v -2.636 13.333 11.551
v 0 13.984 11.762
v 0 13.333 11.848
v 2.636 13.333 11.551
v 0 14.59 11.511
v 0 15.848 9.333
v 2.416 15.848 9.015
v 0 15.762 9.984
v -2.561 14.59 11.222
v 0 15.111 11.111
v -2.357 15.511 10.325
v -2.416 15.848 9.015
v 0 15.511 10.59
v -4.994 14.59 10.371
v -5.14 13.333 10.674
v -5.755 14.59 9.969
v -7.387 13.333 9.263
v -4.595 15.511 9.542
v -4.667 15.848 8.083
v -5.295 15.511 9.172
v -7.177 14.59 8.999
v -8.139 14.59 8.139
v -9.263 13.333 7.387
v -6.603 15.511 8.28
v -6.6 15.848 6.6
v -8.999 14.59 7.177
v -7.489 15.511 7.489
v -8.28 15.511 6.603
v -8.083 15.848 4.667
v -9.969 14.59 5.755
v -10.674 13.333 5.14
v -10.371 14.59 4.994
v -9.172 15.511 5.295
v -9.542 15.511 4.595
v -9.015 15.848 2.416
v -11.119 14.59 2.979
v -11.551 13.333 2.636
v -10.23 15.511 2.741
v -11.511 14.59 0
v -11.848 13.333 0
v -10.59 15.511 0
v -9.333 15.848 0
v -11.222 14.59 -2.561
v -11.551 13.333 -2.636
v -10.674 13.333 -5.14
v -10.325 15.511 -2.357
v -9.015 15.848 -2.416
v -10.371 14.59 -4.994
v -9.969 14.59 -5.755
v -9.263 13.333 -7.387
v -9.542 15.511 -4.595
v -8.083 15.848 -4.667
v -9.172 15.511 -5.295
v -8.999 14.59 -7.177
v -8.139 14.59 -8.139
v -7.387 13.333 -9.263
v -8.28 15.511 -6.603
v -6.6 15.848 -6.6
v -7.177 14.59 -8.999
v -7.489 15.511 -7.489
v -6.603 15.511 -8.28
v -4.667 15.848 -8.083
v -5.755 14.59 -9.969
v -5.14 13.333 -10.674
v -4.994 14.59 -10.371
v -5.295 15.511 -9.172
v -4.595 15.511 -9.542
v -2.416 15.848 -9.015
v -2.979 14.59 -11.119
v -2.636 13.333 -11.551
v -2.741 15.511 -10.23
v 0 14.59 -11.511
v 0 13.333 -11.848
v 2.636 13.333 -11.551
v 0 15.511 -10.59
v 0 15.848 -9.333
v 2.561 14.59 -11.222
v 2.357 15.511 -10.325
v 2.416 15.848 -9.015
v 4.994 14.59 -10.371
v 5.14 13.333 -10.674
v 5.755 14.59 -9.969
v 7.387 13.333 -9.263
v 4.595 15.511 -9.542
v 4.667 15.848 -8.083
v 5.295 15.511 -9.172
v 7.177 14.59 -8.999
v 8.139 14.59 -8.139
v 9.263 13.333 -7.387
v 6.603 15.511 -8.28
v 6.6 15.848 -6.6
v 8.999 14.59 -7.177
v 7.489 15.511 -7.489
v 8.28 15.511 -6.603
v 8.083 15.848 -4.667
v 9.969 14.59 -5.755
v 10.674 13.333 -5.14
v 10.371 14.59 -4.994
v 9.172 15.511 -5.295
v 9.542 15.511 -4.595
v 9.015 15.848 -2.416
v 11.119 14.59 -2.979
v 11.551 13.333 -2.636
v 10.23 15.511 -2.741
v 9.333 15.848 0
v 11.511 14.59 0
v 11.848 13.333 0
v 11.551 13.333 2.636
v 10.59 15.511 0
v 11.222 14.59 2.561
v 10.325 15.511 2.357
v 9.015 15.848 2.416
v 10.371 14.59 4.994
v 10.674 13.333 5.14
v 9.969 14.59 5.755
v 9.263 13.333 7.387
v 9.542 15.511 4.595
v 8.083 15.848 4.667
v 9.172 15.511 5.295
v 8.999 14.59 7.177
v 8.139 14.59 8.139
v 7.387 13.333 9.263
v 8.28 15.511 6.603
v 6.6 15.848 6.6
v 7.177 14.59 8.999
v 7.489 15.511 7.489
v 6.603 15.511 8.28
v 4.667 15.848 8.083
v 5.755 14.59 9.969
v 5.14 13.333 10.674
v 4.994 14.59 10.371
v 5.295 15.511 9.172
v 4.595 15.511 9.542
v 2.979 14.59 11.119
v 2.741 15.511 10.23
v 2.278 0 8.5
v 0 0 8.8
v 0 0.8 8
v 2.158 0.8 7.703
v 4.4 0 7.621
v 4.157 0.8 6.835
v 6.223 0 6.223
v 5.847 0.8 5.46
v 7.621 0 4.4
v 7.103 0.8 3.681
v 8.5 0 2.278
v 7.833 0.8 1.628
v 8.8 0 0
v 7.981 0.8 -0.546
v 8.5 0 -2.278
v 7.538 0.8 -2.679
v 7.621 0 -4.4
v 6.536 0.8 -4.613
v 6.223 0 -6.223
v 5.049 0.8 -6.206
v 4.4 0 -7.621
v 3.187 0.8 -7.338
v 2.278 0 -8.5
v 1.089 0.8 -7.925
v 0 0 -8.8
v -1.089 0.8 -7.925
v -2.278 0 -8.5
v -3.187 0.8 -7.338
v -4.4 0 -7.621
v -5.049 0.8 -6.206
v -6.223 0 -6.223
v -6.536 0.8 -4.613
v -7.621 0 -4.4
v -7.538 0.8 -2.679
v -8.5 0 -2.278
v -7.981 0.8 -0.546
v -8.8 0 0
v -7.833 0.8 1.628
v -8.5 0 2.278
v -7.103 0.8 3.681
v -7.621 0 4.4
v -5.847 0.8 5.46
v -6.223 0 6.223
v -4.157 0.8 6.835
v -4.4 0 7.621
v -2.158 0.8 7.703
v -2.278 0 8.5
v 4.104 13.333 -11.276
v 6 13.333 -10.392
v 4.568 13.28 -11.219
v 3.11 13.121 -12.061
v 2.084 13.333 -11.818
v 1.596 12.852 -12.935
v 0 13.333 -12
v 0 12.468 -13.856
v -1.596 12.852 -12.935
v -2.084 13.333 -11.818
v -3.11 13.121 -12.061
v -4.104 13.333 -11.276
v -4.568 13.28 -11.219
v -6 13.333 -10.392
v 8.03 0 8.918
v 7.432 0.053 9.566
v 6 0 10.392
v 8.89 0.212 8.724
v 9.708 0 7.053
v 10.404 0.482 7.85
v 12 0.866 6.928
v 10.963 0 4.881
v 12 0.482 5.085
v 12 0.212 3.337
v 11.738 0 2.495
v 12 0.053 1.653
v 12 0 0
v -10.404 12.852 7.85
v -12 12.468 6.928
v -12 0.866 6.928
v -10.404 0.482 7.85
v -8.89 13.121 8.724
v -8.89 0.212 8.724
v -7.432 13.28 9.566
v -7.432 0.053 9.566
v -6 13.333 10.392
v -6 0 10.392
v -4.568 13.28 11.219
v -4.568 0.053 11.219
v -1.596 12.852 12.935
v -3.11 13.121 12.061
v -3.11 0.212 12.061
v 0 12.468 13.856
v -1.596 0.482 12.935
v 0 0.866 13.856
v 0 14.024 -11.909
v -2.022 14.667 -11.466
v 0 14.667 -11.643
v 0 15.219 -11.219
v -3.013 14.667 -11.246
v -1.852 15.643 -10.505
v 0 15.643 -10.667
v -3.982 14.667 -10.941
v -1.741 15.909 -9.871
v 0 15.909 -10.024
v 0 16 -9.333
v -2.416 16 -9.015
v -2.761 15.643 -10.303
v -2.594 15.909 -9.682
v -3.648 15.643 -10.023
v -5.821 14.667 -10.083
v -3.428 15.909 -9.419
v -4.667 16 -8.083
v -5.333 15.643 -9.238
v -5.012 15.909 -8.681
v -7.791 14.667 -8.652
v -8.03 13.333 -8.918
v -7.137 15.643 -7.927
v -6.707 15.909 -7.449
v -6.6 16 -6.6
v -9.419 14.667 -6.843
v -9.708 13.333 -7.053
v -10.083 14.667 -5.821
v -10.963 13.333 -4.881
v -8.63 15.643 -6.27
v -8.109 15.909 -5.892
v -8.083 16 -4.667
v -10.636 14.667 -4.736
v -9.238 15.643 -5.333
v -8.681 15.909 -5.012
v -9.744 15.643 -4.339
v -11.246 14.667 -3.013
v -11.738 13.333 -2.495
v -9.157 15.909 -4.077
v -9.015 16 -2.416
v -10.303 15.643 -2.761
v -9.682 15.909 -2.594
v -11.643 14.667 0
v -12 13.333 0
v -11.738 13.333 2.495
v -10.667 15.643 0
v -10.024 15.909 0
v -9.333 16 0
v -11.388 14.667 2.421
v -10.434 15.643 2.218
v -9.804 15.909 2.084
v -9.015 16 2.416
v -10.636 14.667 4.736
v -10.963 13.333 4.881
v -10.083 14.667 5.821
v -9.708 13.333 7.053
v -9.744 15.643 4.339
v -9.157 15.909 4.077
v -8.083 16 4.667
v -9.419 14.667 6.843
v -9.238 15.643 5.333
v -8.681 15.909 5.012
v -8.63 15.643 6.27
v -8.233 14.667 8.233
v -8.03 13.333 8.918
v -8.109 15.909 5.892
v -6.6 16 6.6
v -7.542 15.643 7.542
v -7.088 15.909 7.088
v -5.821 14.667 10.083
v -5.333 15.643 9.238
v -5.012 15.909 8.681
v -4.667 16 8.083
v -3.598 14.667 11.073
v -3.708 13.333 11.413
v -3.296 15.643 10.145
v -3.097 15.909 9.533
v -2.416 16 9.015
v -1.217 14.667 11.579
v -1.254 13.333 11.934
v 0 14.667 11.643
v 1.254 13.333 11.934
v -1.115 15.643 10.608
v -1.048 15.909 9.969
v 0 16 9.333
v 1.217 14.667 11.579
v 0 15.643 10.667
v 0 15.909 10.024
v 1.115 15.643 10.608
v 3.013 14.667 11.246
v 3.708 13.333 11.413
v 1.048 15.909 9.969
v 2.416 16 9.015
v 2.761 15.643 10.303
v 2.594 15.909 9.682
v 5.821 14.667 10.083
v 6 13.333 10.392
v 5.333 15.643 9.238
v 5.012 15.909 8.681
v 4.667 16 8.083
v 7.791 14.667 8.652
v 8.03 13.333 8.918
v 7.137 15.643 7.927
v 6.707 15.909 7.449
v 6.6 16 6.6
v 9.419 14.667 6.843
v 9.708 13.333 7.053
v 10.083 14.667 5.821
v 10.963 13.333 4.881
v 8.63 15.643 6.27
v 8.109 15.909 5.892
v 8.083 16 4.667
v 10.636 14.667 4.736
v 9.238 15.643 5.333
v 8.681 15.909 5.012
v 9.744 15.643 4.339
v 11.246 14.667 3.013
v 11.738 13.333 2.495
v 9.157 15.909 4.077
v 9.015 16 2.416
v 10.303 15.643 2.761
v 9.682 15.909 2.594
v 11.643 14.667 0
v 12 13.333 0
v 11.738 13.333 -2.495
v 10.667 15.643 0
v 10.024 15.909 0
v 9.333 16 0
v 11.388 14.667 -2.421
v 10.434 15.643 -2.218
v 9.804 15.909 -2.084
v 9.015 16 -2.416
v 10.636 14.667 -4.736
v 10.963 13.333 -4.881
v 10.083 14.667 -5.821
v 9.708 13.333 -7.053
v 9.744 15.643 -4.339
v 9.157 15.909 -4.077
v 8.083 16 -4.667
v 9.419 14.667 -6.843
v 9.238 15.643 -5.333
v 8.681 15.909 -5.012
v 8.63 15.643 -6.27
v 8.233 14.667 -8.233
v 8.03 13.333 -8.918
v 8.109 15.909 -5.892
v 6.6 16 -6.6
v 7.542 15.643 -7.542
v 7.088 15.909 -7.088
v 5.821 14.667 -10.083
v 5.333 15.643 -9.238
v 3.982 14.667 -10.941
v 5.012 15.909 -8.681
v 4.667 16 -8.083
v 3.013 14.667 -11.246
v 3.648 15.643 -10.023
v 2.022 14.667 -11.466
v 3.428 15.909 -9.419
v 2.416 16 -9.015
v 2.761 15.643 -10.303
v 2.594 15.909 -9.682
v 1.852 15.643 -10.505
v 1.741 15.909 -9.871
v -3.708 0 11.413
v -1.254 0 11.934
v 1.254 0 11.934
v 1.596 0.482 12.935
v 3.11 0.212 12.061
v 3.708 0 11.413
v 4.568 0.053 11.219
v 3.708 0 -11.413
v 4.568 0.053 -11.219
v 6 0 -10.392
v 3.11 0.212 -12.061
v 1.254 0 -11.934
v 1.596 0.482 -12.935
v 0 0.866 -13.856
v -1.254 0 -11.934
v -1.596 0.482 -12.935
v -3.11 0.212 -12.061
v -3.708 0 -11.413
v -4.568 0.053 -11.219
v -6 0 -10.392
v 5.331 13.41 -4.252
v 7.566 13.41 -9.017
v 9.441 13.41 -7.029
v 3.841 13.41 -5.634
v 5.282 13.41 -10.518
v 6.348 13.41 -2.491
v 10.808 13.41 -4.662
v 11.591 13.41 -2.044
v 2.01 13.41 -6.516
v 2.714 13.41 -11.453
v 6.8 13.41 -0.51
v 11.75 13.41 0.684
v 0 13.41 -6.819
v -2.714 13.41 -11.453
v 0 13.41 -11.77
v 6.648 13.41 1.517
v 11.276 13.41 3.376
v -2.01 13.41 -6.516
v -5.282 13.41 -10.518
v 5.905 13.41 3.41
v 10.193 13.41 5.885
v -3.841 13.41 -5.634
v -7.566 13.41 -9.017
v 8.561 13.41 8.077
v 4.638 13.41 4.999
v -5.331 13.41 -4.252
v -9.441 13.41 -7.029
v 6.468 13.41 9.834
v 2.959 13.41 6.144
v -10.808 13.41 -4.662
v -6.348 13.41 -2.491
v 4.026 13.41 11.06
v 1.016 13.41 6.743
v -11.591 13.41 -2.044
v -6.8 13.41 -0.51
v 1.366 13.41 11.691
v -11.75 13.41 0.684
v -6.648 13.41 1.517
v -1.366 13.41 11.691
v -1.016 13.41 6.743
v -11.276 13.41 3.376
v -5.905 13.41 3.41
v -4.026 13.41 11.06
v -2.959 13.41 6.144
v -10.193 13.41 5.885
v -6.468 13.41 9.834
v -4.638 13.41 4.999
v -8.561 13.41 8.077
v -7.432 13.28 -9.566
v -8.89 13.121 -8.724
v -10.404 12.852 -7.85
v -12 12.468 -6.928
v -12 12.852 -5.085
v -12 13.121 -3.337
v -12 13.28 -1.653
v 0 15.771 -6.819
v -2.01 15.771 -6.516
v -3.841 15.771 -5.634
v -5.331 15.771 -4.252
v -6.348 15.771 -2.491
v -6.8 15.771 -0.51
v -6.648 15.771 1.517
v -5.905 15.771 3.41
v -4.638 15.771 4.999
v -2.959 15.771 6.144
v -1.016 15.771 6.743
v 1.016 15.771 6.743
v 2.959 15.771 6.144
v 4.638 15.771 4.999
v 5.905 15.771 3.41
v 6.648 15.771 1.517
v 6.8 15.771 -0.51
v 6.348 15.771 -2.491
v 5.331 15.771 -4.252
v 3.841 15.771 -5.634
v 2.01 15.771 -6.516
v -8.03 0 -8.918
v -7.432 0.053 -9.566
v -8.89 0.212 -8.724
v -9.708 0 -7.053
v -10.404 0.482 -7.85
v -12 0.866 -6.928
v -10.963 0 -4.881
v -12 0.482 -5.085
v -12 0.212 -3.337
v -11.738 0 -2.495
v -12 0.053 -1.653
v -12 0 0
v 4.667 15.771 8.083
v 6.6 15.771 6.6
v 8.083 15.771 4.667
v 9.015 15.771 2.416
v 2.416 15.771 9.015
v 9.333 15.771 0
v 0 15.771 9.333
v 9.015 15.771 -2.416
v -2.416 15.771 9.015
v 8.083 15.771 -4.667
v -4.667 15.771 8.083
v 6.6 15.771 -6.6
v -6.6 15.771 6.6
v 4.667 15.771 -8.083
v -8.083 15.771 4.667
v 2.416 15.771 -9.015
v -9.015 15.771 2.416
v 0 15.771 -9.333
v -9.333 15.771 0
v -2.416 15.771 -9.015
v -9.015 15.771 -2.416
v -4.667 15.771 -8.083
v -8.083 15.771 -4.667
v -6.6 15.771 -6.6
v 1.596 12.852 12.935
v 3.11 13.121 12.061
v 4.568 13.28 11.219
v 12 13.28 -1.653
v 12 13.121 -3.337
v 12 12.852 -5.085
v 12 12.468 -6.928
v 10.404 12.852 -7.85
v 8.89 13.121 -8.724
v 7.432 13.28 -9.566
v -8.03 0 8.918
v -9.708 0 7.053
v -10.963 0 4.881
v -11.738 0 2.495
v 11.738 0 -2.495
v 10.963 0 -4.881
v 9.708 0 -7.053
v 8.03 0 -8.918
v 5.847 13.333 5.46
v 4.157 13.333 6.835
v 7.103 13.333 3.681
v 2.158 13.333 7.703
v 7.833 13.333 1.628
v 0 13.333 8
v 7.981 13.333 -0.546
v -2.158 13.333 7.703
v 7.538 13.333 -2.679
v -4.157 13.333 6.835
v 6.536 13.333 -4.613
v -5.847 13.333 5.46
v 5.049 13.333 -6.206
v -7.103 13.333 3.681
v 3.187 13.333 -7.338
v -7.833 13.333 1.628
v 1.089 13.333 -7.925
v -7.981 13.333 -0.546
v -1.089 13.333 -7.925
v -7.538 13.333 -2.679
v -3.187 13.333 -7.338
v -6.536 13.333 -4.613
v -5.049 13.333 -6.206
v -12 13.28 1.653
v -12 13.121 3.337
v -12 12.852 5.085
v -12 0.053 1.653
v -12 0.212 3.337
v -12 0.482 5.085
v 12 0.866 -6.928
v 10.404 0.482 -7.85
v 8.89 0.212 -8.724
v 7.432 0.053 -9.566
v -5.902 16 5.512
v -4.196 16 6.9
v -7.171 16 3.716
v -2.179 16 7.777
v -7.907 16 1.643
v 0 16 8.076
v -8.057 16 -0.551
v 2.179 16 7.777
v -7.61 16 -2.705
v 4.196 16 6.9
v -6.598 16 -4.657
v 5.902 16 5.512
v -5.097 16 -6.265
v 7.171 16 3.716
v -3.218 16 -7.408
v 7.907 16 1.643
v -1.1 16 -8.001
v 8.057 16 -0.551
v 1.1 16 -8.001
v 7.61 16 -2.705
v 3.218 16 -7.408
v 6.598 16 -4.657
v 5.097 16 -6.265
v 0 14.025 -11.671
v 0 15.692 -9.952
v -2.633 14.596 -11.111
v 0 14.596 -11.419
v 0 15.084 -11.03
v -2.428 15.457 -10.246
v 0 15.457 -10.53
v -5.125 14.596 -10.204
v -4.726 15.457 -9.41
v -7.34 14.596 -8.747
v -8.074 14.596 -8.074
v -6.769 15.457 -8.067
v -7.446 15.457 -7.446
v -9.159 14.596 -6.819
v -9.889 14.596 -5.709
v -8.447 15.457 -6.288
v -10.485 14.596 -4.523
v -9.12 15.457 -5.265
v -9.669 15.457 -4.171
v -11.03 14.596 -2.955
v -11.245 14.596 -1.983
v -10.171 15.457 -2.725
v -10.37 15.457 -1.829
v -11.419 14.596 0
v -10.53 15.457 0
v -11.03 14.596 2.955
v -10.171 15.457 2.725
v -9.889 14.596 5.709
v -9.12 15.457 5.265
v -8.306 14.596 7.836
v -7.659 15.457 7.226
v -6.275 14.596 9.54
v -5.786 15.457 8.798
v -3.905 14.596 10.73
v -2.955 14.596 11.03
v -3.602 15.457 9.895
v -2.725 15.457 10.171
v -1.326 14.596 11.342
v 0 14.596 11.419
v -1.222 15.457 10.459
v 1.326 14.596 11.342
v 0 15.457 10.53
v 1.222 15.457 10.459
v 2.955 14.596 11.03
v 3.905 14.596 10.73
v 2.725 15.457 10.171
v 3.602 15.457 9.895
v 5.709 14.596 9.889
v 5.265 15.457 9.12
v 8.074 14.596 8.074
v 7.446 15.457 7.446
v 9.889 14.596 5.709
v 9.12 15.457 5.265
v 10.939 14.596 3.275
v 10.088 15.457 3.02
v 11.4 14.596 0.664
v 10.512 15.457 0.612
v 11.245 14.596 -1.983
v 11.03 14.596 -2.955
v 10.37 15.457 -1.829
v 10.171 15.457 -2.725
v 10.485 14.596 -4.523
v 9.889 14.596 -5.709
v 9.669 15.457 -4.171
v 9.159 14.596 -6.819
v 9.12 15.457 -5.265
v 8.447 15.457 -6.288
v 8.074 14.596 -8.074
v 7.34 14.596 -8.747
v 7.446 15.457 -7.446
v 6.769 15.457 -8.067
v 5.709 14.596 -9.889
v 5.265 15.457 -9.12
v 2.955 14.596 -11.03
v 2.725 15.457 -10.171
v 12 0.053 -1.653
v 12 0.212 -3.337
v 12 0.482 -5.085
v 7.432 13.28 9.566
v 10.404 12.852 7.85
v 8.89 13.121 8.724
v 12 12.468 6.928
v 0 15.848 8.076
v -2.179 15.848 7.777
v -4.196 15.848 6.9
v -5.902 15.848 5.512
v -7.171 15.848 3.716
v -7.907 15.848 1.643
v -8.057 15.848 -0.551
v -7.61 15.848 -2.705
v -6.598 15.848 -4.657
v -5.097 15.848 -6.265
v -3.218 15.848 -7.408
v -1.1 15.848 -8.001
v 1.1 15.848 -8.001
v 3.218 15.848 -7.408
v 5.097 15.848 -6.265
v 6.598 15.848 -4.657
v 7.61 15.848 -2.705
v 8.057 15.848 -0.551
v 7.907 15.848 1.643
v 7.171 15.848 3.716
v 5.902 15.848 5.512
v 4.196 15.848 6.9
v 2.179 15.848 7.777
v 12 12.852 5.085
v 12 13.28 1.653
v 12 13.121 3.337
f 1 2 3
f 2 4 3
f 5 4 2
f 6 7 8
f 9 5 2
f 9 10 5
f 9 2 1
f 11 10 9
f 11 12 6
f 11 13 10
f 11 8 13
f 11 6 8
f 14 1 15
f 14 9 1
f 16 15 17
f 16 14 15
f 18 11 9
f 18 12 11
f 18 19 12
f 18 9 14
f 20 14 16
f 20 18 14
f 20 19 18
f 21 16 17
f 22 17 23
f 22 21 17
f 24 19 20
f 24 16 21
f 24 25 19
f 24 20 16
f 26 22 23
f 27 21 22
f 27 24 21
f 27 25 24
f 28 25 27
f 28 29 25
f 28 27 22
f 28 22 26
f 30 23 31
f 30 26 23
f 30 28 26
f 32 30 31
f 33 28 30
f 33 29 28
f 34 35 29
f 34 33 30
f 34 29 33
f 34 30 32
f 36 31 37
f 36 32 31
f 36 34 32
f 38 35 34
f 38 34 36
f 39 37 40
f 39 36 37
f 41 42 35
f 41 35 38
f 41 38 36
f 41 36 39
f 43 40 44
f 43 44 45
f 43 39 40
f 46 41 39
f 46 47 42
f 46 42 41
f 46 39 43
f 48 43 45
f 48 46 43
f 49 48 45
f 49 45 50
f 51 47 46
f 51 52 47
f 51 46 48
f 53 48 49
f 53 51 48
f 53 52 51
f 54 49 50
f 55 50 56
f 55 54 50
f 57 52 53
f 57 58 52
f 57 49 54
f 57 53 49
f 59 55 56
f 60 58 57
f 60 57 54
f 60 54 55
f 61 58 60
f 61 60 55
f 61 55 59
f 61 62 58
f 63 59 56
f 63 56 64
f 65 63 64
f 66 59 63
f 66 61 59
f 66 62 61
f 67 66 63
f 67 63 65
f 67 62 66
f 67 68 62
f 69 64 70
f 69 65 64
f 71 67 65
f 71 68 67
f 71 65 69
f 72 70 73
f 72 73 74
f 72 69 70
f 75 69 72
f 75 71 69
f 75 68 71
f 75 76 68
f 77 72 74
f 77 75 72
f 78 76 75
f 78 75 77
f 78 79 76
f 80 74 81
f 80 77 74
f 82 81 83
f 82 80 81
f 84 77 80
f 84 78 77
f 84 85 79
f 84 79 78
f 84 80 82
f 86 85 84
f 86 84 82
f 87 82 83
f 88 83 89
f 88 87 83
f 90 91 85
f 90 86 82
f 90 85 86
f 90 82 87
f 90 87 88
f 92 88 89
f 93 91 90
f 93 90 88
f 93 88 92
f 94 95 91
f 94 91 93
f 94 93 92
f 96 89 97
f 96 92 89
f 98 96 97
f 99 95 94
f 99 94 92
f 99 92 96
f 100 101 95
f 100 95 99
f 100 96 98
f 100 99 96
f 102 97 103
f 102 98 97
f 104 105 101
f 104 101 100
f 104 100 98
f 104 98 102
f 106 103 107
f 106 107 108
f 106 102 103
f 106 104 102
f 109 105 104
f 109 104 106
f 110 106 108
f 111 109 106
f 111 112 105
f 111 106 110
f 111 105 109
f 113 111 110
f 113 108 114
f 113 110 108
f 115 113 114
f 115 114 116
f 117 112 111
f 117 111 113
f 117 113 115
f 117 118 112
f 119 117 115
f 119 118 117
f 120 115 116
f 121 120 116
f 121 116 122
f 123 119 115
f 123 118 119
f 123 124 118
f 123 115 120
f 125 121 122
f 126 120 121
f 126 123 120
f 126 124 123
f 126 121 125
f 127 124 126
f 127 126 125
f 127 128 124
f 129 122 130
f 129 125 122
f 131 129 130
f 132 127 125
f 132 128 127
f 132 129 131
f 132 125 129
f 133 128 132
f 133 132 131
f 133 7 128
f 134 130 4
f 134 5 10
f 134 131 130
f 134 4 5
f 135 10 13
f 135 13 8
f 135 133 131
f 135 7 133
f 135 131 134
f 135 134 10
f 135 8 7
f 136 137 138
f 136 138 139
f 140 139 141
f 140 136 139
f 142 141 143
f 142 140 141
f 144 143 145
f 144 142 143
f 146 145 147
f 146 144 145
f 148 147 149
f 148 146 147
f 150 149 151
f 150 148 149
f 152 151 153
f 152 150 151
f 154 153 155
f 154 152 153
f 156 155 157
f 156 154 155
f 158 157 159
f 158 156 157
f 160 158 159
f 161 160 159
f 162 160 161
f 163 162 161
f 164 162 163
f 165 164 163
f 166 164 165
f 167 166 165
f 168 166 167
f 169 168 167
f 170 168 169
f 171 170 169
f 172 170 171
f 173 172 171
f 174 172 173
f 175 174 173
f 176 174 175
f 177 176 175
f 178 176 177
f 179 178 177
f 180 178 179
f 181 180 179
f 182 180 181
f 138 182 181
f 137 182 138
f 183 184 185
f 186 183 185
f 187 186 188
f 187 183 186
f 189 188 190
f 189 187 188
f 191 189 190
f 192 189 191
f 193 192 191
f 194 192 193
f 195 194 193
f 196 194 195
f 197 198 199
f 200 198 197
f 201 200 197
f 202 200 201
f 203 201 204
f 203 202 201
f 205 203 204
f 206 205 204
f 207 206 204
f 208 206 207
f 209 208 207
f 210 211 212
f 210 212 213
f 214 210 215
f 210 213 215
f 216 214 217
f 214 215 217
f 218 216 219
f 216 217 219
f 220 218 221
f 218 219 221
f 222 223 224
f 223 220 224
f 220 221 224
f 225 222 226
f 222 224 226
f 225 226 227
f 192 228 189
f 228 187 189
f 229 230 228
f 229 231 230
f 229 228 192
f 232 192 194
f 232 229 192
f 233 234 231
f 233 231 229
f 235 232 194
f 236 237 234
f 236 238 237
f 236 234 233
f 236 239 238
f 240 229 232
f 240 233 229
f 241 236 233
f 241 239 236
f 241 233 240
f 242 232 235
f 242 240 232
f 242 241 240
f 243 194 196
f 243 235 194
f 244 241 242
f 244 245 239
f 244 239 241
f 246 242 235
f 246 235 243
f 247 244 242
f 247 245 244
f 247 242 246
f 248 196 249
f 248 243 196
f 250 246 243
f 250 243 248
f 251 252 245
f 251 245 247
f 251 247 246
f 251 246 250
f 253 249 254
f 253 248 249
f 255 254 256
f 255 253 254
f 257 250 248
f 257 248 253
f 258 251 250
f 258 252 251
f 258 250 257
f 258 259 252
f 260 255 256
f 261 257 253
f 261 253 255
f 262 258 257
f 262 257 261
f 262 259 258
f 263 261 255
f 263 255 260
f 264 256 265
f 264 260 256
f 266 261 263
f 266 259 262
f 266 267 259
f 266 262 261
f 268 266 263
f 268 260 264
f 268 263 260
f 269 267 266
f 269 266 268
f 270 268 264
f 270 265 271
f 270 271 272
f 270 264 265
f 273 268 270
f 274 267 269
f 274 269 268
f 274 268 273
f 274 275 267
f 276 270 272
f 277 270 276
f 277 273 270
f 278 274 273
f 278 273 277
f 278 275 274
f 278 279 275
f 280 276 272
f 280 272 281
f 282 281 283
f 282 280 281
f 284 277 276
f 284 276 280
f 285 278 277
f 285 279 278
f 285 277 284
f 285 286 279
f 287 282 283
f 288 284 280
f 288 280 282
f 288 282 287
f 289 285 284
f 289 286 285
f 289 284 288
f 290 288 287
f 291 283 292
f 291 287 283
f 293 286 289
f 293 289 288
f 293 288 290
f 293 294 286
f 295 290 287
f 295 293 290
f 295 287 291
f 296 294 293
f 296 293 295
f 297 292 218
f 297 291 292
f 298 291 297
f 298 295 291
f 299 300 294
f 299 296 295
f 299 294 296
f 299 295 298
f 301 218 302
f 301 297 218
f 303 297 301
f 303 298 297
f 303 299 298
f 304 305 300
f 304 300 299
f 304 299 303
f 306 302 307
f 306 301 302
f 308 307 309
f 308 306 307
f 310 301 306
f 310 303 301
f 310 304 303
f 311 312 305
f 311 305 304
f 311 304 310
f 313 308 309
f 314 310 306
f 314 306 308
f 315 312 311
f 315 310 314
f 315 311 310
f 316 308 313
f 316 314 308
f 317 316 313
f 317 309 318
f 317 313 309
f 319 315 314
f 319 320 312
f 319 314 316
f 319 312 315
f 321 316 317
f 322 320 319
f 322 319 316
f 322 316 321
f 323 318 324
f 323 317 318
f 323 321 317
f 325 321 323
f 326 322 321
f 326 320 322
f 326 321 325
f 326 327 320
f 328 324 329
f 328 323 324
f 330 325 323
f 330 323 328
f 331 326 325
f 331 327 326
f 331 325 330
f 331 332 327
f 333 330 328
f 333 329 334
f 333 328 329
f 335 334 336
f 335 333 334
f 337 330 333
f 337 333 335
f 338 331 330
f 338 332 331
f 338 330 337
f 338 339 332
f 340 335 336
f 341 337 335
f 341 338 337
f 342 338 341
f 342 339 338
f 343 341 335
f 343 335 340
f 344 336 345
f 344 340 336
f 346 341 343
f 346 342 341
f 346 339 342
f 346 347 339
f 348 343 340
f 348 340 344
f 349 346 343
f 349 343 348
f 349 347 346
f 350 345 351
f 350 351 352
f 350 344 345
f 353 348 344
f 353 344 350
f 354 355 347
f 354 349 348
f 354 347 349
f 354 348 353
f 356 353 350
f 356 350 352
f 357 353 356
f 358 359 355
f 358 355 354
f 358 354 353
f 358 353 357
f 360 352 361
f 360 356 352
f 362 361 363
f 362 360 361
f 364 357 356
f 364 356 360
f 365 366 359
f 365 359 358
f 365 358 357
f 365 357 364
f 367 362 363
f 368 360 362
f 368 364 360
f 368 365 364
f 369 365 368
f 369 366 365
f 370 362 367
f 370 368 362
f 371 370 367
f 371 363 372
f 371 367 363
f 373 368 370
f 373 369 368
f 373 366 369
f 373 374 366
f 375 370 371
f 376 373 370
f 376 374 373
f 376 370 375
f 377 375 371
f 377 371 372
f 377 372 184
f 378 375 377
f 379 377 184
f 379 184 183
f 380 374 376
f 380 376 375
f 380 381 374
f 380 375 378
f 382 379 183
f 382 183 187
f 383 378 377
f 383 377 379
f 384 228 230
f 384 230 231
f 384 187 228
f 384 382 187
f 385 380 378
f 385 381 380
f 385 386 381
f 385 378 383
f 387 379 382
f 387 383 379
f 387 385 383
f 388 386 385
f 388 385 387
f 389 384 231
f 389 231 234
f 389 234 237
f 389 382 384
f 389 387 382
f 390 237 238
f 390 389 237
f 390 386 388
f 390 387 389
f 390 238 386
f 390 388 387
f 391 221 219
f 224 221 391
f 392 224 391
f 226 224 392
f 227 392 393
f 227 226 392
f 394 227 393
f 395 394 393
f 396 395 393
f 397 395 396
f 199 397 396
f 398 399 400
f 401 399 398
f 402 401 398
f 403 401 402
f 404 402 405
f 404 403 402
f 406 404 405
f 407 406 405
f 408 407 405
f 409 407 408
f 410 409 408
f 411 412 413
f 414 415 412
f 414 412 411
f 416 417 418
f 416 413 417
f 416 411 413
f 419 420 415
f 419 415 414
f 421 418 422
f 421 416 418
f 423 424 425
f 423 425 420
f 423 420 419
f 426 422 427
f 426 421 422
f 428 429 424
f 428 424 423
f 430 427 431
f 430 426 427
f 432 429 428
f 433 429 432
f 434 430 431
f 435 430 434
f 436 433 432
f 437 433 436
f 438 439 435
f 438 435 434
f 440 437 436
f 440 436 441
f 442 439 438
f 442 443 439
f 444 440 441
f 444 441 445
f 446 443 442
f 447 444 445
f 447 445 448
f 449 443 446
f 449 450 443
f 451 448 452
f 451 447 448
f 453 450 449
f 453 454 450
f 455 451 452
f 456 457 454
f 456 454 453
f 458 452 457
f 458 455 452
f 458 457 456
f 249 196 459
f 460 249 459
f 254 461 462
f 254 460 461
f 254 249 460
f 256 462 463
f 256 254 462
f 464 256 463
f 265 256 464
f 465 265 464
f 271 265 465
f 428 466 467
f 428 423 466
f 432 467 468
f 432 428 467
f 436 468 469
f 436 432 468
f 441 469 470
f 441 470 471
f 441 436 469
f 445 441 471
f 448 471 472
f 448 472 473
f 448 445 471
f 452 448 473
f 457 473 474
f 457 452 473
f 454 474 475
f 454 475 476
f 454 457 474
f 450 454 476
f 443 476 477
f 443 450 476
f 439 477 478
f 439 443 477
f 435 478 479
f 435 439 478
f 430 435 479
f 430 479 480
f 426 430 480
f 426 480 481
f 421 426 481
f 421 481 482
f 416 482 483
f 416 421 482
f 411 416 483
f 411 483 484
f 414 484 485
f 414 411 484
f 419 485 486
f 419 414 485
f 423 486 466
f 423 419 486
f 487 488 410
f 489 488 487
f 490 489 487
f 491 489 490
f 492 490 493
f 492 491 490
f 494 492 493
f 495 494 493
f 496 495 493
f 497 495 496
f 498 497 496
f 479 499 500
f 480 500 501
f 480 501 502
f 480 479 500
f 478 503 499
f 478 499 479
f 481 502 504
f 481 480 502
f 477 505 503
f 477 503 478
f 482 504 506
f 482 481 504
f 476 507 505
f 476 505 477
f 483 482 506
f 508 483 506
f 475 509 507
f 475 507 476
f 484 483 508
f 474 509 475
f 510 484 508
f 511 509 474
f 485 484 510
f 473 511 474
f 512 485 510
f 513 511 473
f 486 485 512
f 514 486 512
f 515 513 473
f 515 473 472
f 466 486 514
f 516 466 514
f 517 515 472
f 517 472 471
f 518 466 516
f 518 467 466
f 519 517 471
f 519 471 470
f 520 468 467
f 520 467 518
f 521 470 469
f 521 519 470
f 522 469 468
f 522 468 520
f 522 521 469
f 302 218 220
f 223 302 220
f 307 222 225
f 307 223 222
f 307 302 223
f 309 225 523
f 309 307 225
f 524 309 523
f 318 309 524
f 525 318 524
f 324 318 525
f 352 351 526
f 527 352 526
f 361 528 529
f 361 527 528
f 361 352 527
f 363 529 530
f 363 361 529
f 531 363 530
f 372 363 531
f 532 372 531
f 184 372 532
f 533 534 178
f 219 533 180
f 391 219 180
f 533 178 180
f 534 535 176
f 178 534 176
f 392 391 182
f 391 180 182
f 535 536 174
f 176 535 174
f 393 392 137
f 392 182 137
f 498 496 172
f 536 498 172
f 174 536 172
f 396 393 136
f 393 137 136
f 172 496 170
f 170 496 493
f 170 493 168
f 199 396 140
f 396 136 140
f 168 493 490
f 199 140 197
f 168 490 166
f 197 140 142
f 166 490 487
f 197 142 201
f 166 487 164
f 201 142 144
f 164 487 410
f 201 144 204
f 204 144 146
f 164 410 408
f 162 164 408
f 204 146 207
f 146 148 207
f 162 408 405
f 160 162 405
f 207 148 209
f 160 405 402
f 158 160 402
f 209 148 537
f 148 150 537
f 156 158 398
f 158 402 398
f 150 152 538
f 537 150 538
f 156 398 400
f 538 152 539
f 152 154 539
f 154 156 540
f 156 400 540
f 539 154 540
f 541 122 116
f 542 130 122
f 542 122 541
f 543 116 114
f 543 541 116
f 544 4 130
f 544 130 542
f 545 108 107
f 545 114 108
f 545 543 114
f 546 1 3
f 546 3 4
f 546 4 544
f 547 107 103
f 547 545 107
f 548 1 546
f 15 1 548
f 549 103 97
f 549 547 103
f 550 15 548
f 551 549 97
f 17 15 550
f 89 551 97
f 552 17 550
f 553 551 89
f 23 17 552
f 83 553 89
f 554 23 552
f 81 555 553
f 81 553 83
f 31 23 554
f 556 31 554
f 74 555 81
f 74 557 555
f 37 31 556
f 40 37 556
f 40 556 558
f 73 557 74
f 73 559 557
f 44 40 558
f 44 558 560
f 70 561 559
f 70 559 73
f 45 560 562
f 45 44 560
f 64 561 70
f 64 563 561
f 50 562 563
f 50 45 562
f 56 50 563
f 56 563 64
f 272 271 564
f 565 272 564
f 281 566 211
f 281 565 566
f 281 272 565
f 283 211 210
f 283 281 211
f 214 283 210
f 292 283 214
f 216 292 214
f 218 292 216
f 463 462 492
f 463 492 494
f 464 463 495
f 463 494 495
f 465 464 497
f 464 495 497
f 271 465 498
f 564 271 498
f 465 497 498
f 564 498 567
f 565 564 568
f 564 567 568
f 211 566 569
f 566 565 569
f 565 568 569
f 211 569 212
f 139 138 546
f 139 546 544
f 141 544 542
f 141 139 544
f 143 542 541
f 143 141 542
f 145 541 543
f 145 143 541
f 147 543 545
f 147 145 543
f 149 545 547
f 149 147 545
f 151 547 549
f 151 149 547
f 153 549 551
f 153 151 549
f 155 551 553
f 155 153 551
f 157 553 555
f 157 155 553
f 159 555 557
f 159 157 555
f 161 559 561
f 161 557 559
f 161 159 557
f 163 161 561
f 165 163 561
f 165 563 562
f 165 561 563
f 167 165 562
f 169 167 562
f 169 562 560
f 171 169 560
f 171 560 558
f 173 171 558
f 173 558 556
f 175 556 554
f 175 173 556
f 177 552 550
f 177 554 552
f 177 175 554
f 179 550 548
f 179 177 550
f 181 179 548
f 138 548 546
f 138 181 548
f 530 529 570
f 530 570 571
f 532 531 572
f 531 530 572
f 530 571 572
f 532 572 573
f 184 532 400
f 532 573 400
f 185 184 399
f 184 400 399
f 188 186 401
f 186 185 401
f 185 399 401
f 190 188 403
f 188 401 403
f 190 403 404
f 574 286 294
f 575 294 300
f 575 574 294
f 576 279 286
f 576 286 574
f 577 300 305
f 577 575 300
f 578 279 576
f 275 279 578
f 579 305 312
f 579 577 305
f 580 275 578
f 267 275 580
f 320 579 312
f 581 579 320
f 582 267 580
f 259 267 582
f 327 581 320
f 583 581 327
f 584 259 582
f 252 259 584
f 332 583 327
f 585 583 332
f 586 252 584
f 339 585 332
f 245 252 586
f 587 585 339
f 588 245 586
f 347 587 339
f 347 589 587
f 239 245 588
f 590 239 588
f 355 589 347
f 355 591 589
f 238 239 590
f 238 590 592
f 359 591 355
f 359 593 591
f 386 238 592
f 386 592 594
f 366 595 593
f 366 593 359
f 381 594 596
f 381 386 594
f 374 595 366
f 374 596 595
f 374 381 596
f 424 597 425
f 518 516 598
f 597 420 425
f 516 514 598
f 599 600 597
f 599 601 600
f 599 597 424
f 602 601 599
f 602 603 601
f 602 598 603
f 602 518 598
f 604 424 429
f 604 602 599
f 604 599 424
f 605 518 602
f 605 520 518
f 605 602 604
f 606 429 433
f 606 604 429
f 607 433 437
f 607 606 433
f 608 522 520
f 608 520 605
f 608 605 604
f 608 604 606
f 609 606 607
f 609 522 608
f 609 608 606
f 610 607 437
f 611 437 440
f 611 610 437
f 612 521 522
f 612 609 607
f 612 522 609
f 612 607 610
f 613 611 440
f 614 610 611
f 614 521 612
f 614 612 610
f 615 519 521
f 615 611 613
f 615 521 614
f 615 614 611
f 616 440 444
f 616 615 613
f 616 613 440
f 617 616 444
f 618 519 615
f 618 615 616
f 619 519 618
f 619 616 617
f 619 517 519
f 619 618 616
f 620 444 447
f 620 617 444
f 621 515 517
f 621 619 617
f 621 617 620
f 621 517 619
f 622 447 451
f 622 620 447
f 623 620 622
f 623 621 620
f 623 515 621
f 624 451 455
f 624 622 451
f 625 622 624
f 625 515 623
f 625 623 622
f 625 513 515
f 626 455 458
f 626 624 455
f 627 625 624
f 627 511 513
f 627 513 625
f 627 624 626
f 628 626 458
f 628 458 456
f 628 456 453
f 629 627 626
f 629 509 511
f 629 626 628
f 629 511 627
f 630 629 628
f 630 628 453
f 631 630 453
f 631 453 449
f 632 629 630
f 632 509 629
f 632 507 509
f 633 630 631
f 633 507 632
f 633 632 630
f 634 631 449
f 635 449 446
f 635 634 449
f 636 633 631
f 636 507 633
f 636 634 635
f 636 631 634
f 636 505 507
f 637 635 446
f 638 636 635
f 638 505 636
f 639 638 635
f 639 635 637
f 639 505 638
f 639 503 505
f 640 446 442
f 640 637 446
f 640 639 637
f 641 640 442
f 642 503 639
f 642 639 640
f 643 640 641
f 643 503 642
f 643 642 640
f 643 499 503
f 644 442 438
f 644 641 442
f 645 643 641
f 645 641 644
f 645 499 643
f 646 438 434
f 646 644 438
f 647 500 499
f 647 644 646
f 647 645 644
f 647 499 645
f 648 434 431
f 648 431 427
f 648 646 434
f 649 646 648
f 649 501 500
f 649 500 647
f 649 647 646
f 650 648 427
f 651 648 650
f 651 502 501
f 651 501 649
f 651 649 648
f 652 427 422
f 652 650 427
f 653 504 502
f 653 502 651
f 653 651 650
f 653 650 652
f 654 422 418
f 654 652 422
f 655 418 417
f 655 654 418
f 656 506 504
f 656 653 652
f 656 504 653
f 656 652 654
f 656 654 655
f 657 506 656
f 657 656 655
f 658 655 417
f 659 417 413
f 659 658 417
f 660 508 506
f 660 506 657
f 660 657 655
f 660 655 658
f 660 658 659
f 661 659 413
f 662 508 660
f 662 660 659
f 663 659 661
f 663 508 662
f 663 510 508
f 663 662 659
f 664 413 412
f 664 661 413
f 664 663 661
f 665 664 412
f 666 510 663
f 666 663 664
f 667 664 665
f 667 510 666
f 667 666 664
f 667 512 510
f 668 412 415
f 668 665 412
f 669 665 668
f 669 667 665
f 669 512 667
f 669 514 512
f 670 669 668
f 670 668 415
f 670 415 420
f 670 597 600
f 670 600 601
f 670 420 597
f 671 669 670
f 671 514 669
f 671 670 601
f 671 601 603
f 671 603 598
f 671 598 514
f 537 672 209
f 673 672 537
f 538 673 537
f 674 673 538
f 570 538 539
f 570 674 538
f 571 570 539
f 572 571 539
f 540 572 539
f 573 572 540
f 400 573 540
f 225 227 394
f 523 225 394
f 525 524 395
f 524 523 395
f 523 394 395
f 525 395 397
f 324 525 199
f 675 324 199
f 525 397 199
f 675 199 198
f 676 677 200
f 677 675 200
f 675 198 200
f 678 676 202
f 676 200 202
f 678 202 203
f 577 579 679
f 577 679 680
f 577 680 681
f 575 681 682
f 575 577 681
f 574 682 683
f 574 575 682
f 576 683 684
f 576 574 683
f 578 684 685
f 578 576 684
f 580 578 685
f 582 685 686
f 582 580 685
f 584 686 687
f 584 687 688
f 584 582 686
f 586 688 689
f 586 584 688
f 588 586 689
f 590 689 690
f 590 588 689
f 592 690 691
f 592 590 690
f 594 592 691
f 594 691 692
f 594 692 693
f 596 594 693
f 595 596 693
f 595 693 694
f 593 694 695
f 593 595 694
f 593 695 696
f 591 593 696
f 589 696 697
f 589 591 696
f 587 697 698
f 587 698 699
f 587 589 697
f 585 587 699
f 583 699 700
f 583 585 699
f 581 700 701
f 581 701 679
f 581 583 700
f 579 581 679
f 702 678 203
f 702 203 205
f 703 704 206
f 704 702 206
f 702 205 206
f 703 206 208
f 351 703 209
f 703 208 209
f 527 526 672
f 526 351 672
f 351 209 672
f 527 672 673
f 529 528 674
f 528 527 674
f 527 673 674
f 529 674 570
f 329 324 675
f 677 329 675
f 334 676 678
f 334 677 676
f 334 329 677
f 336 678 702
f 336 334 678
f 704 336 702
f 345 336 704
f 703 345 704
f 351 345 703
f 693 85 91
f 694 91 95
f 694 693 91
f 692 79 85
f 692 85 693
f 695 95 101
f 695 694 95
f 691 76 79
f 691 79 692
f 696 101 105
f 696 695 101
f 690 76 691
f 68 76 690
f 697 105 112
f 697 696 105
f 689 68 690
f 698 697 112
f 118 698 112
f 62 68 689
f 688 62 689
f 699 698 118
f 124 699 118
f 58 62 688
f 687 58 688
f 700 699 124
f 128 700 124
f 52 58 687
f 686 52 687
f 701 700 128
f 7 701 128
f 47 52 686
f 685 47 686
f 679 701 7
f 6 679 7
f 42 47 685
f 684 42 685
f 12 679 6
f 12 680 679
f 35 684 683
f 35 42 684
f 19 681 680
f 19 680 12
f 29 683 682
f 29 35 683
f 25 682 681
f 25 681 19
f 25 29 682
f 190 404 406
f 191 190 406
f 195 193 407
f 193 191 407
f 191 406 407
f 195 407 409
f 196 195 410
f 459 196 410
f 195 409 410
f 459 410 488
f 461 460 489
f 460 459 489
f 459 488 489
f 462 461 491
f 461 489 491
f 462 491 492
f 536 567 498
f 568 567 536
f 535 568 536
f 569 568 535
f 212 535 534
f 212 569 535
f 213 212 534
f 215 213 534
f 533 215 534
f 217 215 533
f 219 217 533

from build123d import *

# Parameters (mm, degrees)
SKETCH1_R      = 8
EXTRUDE1_DEPTH = 16
CHAMFER1_SIZE  = 0.8


with BuildPart() as part:
    # Sketch1 → Extrude1 (new body)
    with BuildSketch(Plane(origin=(0, 0, 0), x_dir=(1, 0, 0), z_dir=(0, 1, 0))):
        Polygon((0, 13.856406461), (-12, 6.92820323), (-12, -6.92820323), (0, -13.856406461), (12, -6.92820323), (12, 6.92820323), align=None)
        Circle(SKETCH1_R, mode=Mode.SUBTRACT)
    extrude(amount=EXTRUDE1_DEPTH)

    # Chamfer1
    chamfer1_edges = [part.edges().sort_by_distance(p)[0] for p in [
        (-8, 0, 0),
    ]]
    chamfer(chamfer1_edges, length=CHAMFER1_SIZE)

    # Sketch5 → Cut-Revolve3 (revolve, cut)
    with BuildSketch(Plane(origin=(0, 0, 0), x_dir=(0, 0, -1), z_dir=(1, 0, 0))):
        with BuildLine():
            Line((0, 0), (12, 0))
            Line((12, 0), (13.856406461, 0.865656549))
            Line((13.856406461, 0.865656549), (13.856406461, 12.467676784))
            Line((13.856406461, 12.467676784), (12, 13.333333333))
            ThreePointArc((12, 13.333333333), (11.218951416, 15.218951416), (9.333333333, 16))
            Line((9.333333333, 16), (9.333333333, 17.27))
            Line((9.333333333, 17.27), (15.126406461, 17.27))
            Line((15.126406461, 17.27), (15.126406461, -1.27))
            Line((15.126406461, -1.27), (0, -1.27))
            Line((0, -1.27), (0, 0))
        make_face()
    revolve(axis=Axis((0, 0, 0), (0, 1, 0)), mode=Mode.SUBTRACT)

    # Sketch6 → Cut-Revolve4 (revolve, cut)
    with BuildSketch(Plane(origin=(0, 0, 0), x_dir=(0, 0, -1), z_dir=(1, 0, 0))):
        with BuildLine():
            Line((0, 13.333333333), (11.8476, 13.333333333))
            ThreePointArc((11.8476, 13.333333333), (11.111188343, 15.111188343), (9.333333333, 15.8476))
            Line((9.333333333, 15.8476), (8.0762, 15.8476))
            Line((8.0762, 15.8476), (8.0762, 17.27))
            Line((8.0762, 17.27), (0, 17.27))
            Line((0, 17.27), (0, 13.333333333))
        make_face()
    revolve(axis=Axis((0, 17.27, 0), (0, -1, 0)), mode=Mode.SUBTRACT)


with BuildPart() as body_2:
    # Sketch7 → Revolve2 (revolve)
    with BuildSketch(Plane(origin=(0, 0, 0), x_dir=(0, 0, -1), z_dir=(1, 0, 0))):
        with BuildLine():
            Line((6.819066667, 13.409533333), (11.770208921, 13.409533333))
            ThreePointArc((11.770208921, 13.409533333), (11.030152179, 15.084040298), (9.333333333, 15.7714))
            Line((9.333333333, 15.7714), (6.819066667, 15.7714))
            Line((6.819066667, 15.7714), (6.819066667, 13.409533333))
        make_face()
    revolve(axis=Axis((0, 13.409533333, 0), (0, 1, 0)))


solid = Compound([part.part, body_2.part])
